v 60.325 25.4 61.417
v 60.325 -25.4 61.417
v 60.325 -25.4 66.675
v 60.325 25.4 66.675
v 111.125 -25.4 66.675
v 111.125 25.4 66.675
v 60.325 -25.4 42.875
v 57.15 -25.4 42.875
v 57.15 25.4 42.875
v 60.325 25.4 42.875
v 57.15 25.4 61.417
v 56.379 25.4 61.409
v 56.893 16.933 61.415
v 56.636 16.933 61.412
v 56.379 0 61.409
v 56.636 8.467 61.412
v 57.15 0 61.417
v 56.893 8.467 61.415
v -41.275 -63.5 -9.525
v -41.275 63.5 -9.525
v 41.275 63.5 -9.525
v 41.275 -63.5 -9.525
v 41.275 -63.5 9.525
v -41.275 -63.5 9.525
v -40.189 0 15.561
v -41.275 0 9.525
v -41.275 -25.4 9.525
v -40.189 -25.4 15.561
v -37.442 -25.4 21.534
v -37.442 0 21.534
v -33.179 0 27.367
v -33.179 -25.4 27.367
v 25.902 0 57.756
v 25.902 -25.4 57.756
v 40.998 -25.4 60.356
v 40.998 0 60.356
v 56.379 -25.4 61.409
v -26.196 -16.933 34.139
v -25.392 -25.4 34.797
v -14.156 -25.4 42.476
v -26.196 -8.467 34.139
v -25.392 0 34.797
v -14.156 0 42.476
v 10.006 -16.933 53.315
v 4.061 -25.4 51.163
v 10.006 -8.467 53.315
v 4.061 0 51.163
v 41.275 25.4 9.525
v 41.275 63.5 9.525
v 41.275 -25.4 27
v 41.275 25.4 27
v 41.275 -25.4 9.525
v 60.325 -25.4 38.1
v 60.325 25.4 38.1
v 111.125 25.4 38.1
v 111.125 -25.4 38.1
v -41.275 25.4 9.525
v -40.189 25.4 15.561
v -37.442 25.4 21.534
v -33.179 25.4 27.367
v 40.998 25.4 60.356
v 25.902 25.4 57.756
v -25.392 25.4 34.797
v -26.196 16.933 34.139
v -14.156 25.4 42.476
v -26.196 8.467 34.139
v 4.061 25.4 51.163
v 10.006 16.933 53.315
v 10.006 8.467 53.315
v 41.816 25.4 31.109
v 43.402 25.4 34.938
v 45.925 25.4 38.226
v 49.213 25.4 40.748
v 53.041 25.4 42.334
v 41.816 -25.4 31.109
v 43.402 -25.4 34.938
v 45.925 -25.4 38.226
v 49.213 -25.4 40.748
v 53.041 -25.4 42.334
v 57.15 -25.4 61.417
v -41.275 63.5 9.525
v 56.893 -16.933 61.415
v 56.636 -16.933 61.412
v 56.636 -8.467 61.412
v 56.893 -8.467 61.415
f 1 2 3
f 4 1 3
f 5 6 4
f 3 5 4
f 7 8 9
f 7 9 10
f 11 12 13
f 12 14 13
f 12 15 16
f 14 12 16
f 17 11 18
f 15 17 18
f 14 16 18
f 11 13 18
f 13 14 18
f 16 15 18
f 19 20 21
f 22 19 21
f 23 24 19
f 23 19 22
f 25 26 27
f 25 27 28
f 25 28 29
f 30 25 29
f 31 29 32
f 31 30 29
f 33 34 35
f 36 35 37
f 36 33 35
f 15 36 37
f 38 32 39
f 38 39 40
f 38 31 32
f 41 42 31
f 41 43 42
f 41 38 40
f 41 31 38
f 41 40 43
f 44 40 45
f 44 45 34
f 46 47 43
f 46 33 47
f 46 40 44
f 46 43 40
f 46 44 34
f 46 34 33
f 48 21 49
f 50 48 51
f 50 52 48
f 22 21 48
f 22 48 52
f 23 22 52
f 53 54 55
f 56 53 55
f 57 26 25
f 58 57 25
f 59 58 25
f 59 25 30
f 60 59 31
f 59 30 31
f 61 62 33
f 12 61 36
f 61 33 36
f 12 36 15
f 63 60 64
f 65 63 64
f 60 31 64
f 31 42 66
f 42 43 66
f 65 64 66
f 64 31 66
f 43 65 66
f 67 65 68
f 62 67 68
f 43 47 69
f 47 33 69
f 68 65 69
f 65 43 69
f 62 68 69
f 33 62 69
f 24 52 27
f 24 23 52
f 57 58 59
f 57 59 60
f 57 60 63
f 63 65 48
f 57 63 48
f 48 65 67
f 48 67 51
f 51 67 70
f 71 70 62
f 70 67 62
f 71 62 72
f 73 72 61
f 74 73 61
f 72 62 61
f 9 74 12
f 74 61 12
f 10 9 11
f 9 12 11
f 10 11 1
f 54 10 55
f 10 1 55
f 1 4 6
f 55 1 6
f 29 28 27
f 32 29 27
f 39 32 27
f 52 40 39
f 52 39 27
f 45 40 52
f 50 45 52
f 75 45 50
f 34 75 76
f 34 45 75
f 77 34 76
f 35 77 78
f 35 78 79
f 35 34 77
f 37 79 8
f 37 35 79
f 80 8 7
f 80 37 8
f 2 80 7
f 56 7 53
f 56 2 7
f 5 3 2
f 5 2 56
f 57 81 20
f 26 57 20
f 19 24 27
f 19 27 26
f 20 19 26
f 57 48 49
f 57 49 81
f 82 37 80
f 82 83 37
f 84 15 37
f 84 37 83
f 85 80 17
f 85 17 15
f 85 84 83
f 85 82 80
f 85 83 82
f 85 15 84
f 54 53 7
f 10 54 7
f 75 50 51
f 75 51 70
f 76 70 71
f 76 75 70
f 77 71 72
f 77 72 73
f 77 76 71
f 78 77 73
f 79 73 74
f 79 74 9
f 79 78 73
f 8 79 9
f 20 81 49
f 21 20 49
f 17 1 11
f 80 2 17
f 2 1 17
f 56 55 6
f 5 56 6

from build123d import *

# Parameters (mm, degrees)
F1_DEPTH = 63.5
F2_DEPTH = 25.4
F0_W     = 25.4
F0_H     = 18.5420008242
F0_H_2   = 5.2577991758
F0_H_3   = 4.7752
F3_DEPTH = 25.4


with BuildPart() as f1:
    # F0 (on Front) → F1 (new body, symmetric)
    with BuildSketch(Plane.XZ):
        Polygon((-41.275, 9.525), (-41.275, -9.525), (41.275, -9.525), (41.275, 9.525), (22.7329991758, 9.525), align=None)
    extrude(amount=F1_DEPTH, both=True)

    # F0 (on Front) → F2 (join, symmetric)
    with BuildSketch(Plane.XZ):
        with BuildLine():
            Line((22.7329991758, 9.525), (41.275, 9.525))
            Line((41.275, 9.525), (41.275, 27.0002))
            ThreePointArc((41.275, 27.0002), (45.9246798487, 38.2255201513), (57.15, 42.8752))
            Line((57.15, 42.8752), (60.325, 42.8752))
            Line((60.325, 42.8752), (60.325, 61.4172008242))
            Line((60.325, 61.4172008242), (57.15, 61.4172008242))
            add(Edge.make_bspline(
                [(56.3787146856, 61.4085574833), (56.6358462416, 61.412165765), (56.8929439024, 61.4150481962), (57.15, 61.4172008242)],
                knots=[110.67146519, 110.67146519, 110.67146519, 110.67146519, 111.2667116948, 111.2667116948, 111.2667116948, 111.2667116948], degree=3))
            ThreePointArc((56.3787146856, 61.4085574833), (32.5423256581, 51.0624590215), (22.7329991758, 27.0002))
            Line((22.7329991758, 27.0002), (22.7329991758, 9.525))
        make_face()
    extrude(amount=F2_DEPTH, both=True)

    # F0 (on Front) → F3 (join, symmetric)
    with BuildSketch(Plane.XZ):
        Polygon((-41.275, 9.525), (-41.275, -9.525), (41.275, -9.525), (41.275, 9.525), (22.7329991758, 9.525), align=None)
        with BuildLine():
            add(Edge.make_bspline(
                [(-41.275, 9.525), (-40.4075770381, 34.9754176722), (8.5714183415, 60.7376861335), (56.3787146856, 61.4085574833)],
                knots=[0, 0, 0, 0, 110.67146519, 110.67146519, 110.67146519, 110.67146519], degree=3))
            Line((-41.275, 9.525), (22.7329991758, 9.525))
            Line((22.7329991758, 9.525), (22.7329991758, 27.0002))
            ThreePointArc((22.7329991758, 27.0002), (32.5423256581, 51.0624590215), (56.3787146856, 61.4085574833))
        make_face()
        with BuildLine():
            Line((22.7329991758, 9.525), (41.275, 9.525))
            Line((41.275, 9.525), (41.275, 27.0002))
            ThreePointArc((41.275, 27.0002), (45.9246798487, 38.2255201513), (57.15, 42.8752))
            Line((57.15, 42.8752), (60.325, 42.8752))
            Line((60.325, 42.8752), (60.325, 61.4172008242))
            Line((60.325, 61.4172008242), (57.15, 61.4172008242))
            add(Edge.make_bspline(
                [(56.3787146856, 61.4085574833), (56.6358462416, 61.412165765), (56.8929439024, 61.4150481962), (57.15, 61.4172008242)],
                knots=[110.67146519, 110.67146519, 110.67146519, 110.67146519, 111.2667116948, 111.2667116948, 111.2667116948, 111.2667116948], degree=3))
            ThreePointArc((56.3787146856, 61.4085574833), (32.5423256581, 51.0624590215), (22.7329991758, 27.0002))
            Line((22.7329991758, 27.0002), (22.7329991758, 9.525))
        make_face()
        with Locations((73.025, 52.1462004121)):
            Rectangle(F0_W, F0_H)
        with Locations((73.025, 64.0461004121)):
            Rectangle(F0_W, F0_H_2)
        with Locations((73.025, 40.4876)):
            Rectangle(F0_W, F0_H_3)
        Polygon((85.725, 66.675), (85.725, 61.4172008242), (85.725, 42.8752), (85.725, 38.1), (111.125, 38.1), (111.125, 66.675), align=None)
    extrude(amount=F3_DEPTH, both=True)


solid = f1.part
